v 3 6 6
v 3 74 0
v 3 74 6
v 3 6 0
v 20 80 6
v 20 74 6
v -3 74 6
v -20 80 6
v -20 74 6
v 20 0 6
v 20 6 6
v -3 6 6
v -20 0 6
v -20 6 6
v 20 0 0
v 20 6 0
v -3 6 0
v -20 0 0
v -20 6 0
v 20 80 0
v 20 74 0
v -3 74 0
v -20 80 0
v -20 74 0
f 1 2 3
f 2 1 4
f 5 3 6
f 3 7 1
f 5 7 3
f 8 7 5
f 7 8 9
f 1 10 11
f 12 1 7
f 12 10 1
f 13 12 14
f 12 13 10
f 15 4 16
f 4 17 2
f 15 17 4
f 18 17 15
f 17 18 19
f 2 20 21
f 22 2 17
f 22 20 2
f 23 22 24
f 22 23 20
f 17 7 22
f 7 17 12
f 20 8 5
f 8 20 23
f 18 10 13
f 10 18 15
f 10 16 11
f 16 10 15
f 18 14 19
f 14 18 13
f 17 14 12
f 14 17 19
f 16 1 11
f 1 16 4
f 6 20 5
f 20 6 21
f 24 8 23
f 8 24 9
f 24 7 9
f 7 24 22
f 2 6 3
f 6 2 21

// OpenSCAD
//I
z=6;
x=40;
union(){ 
 	translate([-(z/2),0,0]) cube([z,x*2,z]);
	translate([-x/2,0,0]) cube([x,z,z]);
  	translate([-x/2,x+x-z,0]) cube([x,z,z]);
}
